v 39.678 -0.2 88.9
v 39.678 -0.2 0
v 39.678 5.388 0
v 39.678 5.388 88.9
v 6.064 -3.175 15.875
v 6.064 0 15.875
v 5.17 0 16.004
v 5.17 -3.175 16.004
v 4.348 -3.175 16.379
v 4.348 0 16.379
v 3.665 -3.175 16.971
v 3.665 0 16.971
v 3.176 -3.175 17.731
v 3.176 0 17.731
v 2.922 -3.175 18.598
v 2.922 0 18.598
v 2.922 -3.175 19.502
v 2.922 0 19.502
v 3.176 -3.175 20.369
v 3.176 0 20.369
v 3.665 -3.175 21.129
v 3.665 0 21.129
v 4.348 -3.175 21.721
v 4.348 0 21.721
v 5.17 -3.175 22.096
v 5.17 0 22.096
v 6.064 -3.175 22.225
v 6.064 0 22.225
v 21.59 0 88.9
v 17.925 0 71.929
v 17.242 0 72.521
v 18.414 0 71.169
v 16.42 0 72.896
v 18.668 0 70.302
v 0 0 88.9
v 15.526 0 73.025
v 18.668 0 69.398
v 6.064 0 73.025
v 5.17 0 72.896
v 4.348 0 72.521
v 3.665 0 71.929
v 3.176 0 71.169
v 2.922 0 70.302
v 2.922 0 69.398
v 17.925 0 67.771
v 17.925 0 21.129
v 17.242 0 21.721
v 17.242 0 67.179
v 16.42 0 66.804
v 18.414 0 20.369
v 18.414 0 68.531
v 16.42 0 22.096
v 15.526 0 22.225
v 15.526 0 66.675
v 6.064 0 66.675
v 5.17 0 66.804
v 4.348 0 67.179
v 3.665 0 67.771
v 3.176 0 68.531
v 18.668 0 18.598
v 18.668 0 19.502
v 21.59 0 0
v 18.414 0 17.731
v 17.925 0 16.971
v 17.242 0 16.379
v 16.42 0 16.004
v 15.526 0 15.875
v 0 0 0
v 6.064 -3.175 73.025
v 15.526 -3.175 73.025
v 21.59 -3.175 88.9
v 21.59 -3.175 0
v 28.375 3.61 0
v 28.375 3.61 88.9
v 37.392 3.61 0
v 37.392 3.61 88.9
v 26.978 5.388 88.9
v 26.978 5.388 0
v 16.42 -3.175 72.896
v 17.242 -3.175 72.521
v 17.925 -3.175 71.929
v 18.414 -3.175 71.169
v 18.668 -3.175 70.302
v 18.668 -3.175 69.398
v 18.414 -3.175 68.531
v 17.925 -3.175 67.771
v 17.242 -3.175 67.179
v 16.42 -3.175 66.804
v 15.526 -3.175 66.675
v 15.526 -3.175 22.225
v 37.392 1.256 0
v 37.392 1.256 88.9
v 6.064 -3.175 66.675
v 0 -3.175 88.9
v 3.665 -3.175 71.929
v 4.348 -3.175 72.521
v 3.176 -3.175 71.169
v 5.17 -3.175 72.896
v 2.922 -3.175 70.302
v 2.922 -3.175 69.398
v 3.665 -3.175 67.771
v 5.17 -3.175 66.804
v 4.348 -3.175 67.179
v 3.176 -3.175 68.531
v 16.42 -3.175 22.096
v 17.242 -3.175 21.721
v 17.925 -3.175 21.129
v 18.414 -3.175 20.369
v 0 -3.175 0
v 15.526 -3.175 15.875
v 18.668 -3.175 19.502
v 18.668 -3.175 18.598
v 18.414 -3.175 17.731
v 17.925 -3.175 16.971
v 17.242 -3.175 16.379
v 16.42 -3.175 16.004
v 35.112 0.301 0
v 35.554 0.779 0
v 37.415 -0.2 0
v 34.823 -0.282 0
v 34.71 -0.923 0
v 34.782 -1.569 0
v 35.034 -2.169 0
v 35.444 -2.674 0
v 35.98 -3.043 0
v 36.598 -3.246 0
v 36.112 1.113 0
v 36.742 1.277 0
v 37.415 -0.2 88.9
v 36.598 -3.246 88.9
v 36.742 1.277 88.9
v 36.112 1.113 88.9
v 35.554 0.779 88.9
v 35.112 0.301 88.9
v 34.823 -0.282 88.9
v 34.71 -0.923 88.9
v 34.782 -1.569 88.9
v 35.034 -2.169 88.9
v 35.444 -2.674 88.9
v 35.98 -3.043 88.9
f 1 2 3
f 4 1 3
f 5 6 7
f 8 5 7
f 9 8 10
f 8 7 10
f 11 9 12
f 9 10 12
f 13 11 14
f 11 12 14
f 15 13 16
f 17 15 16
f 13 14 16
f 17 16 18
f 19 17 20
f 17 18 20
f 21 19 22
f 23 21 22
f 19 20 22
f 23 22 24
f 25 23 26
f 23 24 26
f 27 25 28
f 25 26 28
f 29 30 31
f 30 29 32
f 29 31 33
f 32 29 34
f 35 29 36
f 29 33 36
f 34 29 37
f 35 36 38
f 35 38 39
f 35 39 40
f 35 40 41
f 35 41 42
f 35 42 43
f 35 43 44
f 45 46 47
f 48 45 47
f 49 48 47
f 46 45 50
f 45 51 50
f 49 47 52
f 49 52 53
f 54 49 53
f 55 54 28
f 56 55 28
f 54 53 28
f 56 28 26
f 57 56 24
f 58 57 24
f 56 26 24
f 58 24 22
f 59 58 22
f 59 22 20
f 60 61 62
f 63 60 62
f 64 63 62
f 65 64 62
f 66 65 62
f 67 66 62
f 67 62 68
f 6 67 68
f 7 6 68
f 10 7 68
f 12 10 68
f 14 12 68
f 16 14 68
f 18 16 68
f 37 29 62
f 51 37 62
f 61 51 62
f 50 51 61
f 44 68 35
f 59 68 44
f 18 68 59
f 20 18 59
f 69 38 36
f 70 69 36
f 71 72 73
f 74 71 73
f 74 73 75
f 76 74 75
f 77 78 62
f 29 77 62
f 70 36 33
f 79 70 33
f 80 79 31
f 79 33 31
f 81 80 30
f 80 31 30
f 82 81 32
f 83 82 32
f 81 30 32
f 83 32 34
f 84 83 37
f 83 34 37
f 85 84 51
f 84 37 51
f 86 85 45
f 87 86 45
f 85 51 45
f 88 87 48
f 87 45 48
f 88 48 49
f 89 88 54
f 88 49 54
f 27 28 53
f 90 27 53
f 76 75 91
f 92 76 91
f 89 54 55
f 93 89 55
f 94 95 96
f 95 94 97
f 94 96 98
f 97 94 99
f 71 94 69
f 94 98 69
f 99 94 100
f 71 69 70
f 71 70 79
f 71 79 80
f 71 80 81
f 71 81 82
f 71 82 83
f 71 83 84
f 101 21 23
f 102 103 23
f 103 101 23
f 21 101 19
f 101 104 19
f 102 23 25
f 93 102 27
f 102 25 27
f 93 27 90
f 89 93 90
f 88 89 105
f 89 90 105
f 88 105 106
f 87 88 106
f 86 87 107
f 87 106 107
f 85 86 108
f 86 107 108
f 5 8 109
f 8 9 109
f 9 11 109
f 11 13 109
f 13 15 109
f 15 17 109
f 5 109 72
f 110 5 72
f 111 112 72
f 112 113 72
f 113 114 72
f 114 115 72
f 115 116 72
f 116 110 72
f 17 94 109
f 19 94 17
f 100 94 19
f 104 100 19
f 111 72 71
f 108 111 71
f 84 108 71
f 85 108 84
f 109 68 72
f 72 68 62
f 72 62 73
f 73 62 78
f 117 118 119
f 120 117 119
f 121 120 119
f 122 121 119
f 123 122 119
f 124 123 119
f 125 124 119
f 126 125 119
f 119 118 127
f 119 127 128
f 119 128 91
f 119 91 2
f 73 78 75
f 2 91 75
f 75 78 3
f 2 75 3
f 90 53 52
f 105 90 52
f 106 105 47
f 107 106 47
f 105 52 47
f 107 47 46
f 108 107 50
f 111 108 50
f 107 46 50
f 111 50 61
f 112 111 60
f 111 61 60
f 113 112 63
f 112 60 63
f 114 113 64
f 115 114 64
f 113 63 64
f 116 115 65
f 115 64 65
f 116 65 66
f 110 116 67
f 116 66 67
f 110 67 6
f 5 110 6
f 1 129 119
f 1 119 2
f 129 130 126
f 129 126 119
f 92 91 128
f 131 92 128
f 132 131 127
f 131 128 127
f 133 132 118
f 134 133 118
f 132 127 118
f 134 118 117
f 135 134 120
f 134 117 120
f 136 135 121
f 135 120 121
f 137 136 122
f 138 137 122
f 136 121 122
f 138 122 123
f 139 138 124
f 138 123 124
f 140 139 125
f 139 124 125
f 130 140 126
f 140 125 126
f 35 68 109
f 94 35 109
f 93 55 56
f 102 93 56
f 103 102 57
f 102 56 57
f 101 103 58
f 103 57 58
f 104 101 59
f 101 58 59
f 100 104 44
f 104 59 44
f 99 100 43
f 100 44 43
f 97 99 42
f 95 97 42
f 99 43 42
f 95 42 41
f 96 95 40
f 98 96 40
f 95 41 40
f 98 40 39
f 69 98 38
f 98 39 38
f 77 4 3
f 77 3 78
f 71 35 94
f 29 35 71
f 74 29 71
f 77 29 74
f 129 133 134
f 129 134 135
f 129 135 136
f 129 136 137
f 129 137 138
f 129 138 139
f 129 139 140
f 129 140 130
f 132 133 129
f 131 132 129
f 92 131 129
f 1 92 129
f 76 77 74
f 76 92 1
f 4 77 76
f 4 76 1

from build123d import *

# Parameters (mm, degrees)
F1_DEPTH = 88.9
F3_DEPTH = 25.4
F4_ANGLE = -90


with BuildPart() as f1:
    # F0 (on Front) → F1 (new body)
    with BuildSketch(Plane.XZ):
        Polygon((21.59, 0), (0, 0), (0, -3.175), (21.59, -3.175), (28.3751536726, 3.6101536726), (37.3921536726, 3.6101536726), (37.3921536726, 1.256122898), (36.5982342043, -3.2464181487), (37.4145606636, -0.1998463274), (39.6781536726, -0.1998463274), (39.6781536726, 5.3881536726), (26.9781536726, 5.3881536726), align=None)
        with BuildLine():
            Line((36.5982342043, -3.2464181487), (37.3921536726, 1.256122898))
            ThreePointArc((37.3921536726, 1.256122898), (34.7439234151, -0.5981878912), (36.5982342043, -3.2464181487))
        make_face()
    extrude(amount=F1_DEPTH)

    # F2 (on face) → F3 (cut)
    with BuildSketch(Plane.XY):
        with BuildLine():
            Line((10.795, -22.225), (10.795, -15.875))
            Line((10.795, -15.875), (6.06425, -15.875))
            ThreePointArc((6.06425, -15.875), (2.88925, -19.05), (6.06425, -22.225))
            Line((6.06425, -22.225), (10.795, -22.225))
        make_face()
        with BuildLine():
            Line((15.52575, -15.875), (10.795, -15.875))
            Line((10.795, -15.875), (10.795, -22.225))
            Line((10.795, -22.225), (15.52575, -22.225))
            ThreePointArc((15.52575, -22.225), (18.70075, -19.05), (15.52575, -15.875))
        make_face()
        with BuildLine():
            Line((10.795, -73.025), (10.795, -66.675))
            Line((10.795, -66.675), (6.06425, -66.675))
            ThreePointArc((6.06425, -66.675), (2.88925, -69.85), (6.06425, -73.025))
            Line((6.06425, -73.025), (10.795, -73.025))
        make_face()
        with BuildLine():
            Line((15.52575, -66.675), (10.795, -66.675))
            Line((10.795, -66.675), (10.795, -73.025))
            Line((10.795, -73.025), (15.52575, -73.025))
            ThreePointArc((15.52575, -73.025), (18.70075, -69.85), (15.52575, -66.675))
        make_face()
    extrude(amount=-F3_DEPTH, mode=Mode.SUBTRACT)


with BuildPart() as f1_1:
    # F4: moved
    add(f1.part.rotate(Axis((10.795, 0, 0), (1, 0, 0)), F4_ANGLE))


solid = f1_1.part
